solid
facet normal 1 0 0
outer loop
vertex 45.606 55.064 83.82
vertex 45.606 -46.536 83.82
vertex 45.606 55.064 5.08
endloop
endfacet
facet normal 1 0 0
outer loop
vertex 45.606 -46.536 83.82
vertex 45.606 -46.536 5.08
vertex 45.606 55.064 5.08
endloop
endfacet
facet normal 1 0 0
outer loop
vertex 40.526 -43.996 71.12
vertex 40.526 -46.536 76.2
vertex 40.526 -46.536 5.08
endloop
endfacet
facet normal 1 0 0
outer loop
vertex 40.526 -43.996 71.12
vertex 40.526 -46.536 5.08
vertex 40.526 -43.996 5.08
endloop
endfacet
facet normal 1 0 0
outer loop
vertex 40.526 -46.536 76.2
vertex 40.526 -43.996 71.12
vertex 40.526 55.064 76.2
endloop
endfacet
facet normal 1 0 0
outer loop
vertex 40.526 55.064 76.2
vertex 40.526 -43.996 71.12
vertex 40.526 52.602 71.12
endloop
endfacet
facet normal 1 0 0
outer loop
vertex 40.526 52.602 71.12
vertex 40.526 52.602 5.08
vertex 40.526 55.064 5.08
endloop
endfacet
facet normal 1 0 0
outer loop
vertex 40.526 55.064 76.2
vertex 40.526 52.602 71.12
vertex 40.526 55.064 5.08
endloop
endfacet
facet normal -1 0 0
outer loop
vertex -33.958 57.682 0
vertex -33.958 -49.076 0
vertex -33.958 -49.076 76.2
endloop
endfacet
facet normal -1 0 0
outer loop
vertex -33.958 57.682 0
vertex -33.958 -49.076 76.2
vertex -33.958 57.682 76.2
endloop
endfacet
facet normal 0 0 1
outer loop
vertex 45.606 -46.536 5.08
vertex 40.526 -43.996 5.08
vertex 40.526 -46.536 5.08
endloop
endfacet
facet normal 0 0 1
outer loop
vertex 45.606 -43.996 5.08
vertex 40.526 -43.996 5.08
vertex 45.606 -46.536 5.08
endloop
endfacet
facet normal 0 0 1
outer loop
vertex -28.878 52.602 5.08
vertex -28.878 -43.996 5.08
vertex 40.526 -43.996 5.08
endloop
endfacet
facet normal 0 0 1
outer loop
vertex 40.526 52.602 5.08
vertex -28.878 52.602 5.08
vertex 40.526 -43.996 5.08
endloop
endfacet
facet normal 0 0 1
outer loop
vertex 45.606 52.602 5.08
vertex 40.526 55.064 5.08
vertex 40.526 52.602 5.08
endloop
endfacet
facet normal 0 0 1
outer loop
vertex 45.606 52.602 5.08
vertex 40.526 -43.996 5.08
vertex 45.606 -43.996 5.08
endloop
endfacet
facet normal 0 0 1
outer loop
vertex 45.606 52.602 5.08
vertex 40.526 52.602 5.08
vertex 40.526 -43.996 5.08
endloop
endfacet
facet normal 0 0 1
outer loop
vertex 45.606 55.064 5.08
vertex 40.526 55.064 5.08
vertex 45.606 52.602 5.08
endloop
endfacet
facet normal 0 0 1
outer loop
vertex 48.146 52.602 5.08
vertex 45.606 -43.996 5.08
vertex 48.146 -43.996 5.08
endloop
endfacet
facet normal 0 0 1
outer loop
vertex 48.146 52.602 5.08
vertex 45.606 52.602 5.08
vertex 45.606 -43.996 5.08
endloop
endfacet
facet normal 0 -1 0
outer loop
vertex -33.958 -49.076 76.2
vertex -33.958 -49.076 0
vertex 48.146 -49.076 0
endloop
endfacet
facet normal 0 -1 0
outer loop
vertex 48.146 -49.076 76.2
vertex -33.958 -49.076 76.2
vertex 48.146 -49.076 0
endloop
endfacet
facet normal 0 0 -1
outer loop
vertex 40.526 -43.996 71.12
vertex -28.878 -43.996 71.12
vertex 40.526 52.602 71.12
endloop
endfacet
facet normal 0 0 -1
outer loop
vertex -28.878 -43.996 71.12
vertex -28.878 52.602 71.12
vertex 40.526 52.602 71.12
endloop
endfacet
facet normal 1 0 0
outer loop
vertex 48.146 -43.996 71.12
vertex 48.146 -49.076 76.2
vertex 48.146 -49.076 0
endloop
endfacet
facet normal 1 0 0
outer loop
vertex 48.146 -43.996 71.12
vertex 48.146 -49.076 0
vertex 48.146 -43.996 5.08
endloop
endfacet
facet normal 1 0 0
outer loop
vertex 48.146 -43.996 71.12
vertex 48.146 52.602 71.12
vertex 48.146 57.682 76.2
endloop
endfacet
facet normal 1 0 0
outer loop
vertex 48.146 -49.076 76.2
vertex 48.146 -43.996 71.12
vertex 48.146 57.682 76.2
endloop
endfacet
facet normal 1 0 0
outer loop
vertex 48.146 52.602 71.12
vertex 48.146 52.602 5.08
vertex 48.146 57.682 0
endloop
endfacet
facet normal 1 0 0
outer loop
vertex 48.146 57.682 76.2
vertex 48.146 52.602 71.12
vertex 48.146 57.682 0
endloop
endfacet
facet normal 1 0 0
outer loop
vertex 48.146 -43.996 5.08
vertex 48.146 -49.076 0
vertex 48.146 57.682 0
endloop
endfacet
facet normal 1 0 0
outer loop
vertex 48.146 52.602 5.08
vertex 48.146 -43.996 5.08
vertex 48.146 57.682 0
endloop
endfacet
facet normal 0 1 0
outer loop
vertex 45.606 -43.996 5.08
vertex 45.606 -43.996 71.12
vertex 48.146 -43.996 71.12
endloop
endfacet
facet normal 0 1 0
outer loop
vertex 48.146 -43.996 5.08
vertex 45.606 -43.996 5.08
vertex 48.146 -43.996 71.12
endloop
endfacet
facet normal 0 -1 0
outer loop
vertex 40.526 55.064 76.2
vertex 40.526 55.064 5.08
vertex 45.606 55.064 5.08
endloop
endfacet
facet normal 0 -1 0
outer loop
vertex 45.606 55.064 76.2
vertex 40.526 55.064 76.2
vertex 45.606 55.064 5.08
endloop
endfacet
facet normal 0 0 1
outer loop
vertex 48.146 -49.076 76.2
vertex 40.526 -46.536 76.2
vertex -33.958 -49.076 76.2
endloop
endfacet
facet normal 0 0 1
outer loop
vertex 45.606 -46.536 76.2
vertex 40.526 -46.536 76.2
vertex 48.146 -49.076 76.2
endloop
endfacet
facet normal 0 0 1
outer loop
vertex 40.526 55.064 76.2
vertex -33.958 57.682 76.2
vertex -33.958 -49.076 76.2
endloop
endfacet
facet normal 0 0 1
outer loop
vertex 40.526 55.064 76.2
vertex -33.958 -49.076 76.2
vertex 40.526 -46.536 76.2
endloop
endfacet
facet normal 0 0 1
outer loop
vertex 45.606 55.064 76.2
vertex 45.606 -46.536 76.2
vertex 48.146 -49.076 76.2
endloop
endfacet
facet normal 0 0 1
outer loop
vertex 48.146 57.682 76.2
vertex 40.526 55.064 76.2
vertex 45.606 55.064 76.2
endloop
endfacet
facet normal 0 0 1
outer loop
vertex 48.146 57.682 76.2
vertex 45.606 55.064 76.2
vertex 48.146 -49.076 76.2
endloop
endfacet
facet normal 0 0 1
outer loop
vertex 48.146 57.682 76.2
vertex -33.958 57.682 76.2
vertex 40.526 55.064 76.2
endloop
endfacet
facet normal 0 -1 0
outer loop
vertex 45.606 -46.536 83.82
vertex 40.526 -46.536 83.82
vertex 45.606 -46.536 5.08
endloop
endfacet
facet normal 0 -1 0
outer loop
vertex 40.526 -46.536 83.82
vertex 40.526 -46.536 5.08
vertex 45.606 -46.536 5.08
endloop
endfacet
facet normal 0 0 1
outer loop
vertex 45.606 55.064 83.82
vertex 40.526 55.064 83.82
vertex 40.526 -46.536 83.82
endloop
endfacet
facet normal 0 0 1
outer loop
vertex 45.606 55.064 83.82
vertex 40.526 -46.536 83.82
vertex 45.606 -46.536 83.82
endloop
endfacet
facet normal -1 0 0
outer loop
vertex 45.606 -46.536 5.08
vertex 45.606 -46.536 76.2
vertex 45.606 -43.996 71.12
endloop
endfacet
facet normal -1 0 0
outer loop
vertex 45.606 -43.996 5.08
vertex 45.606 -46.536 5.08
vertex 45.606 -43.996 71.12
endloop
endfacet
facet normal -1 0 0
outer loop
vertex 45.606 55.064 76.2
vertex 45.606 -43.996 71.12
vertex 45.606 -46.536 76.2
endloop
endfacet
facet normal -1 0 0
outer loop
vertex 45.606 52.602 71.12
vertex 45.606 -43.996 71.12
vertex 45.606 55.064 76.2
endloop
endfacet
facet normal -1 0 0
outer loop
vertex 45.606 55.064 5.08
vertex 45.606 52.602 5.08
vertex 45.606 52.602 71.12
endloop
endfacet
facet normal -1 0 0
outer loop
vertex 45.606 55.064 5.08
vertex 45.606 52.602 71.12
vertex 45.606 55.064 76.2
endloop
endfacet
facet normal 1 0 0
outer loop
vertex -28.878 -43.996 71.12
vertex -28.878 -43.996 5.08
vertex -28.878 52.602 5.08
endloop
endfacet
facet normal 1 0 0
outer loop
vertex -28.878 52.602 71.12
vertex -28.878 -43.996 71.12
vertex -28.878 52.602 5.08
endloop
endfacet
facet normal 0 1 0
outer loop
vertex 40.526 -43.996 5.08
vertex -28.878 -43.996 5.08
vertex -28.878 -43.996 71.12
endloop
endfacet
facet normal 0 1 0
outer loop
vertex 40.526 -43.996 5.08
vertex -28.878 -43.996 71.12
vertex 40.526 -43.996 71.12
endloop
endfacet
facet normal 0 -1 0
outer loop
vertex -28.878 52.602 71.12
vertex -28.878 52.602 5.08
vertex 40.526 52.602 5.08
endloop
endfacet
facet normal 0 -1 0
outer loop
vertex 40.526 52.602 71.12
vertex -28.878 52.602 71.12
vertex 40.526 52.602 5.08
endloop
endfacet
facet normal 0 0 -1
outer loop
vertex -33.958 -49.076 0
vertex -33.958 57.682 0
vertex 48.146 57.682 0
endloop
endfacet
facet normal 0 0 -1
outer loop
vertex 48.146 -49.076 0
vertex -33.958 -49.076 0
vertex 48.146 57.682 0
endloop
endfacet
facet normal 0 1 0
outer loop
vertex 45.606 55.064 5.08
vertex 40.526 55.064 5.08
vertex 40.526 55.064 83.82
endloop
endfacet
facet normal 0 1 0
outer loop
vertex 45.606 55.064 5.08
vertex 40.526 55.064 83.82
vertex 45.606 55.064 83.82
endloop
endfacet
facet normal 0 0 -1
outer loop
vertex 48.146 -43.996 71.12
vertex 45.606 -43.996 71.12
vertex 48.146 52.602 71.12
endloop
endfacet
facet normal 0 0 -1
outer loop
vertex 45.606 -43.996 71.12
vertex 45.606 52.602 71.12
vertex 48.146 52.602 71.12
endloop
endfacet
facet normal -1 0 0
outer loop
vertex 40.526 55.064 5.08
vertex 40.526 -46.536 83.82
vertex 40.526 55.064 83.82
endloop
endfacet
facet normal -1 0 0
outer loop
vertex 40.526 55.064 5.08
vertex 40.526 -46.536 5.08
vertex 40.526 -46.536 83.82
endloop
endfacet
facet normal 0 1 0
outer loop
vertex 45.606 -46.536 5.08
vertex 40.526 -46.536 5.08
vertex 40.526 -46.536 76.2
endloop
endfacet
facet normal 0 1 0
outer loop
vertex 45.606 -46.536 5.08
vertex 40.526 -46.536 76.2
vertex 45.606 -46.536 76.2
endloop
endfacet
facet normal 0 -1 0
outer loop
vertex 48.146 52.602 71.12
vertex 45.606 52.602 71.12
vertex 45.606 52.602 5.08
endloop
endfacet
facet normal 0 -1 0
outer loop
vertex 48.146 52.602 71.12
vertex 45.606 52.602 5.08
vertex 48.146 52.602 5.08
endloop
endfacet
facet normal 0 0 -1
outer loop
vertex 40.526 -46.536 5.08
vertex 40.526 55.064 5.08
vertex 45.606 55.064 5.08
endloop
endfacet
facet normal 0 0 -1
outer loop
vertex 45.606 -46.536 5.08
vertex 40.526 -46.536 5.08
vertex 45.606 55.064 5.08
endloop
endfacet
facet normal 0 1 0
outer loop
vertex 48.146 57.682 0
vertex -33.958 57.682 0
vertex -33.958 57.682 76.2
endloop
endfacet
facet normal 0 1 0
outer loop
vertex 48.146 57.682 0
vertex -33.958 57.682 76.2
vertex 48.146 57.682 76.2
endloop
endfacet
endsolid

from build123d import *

# Parameters (mm, degrees)
F0_W          = 82.1032822132
F0_H          = 106.7575290799
F1_DEPTH      = 76.2
F2_T          = -5.08
F3_W          = 5.08
F3_H          = 101.6
F4_DEPTH      = 71.12
F4_DEPTH_BACK = 7.62


with BuildPart() as f1:
    # F0 (on Top) → F1 (new body)
    with BuildSketch(Plane.XY):
        with Locations((7.0939101279, 4.3028630316)):
            Rectangle(F0_W, F0_H)
    extrude(amount=F1_DEPTH)

    # F2
    f2_openings = [f1.faces().sort_by_distance(p)[0] for p in [
        (48.145551, 4.302863, 38.1),
    ]]
    offset(amount=F2_T, openings=f2_openings)


with BuildPart() as f4:
    # F3 (on face) → F4 (new body, two sides)
    with BuildSketch(Plane.XY.offset(76.2)) as f4_sk:
        with Locations((43.0655512345, 4.2640984917)):
            Rectangle(F3_W, F3_H)
    extrude(amount=-F4_DEPTH)
    extrude(f4_sk.sketch, amount=F4_DEPTH_BACK)


with BuildPart() as f1_1:
    add(f1.part)

    # F5: cut F4
    add(f4.part, mode=Mode.SUBTRACT)


solid = Compound([f4.part, f1_1.part])
